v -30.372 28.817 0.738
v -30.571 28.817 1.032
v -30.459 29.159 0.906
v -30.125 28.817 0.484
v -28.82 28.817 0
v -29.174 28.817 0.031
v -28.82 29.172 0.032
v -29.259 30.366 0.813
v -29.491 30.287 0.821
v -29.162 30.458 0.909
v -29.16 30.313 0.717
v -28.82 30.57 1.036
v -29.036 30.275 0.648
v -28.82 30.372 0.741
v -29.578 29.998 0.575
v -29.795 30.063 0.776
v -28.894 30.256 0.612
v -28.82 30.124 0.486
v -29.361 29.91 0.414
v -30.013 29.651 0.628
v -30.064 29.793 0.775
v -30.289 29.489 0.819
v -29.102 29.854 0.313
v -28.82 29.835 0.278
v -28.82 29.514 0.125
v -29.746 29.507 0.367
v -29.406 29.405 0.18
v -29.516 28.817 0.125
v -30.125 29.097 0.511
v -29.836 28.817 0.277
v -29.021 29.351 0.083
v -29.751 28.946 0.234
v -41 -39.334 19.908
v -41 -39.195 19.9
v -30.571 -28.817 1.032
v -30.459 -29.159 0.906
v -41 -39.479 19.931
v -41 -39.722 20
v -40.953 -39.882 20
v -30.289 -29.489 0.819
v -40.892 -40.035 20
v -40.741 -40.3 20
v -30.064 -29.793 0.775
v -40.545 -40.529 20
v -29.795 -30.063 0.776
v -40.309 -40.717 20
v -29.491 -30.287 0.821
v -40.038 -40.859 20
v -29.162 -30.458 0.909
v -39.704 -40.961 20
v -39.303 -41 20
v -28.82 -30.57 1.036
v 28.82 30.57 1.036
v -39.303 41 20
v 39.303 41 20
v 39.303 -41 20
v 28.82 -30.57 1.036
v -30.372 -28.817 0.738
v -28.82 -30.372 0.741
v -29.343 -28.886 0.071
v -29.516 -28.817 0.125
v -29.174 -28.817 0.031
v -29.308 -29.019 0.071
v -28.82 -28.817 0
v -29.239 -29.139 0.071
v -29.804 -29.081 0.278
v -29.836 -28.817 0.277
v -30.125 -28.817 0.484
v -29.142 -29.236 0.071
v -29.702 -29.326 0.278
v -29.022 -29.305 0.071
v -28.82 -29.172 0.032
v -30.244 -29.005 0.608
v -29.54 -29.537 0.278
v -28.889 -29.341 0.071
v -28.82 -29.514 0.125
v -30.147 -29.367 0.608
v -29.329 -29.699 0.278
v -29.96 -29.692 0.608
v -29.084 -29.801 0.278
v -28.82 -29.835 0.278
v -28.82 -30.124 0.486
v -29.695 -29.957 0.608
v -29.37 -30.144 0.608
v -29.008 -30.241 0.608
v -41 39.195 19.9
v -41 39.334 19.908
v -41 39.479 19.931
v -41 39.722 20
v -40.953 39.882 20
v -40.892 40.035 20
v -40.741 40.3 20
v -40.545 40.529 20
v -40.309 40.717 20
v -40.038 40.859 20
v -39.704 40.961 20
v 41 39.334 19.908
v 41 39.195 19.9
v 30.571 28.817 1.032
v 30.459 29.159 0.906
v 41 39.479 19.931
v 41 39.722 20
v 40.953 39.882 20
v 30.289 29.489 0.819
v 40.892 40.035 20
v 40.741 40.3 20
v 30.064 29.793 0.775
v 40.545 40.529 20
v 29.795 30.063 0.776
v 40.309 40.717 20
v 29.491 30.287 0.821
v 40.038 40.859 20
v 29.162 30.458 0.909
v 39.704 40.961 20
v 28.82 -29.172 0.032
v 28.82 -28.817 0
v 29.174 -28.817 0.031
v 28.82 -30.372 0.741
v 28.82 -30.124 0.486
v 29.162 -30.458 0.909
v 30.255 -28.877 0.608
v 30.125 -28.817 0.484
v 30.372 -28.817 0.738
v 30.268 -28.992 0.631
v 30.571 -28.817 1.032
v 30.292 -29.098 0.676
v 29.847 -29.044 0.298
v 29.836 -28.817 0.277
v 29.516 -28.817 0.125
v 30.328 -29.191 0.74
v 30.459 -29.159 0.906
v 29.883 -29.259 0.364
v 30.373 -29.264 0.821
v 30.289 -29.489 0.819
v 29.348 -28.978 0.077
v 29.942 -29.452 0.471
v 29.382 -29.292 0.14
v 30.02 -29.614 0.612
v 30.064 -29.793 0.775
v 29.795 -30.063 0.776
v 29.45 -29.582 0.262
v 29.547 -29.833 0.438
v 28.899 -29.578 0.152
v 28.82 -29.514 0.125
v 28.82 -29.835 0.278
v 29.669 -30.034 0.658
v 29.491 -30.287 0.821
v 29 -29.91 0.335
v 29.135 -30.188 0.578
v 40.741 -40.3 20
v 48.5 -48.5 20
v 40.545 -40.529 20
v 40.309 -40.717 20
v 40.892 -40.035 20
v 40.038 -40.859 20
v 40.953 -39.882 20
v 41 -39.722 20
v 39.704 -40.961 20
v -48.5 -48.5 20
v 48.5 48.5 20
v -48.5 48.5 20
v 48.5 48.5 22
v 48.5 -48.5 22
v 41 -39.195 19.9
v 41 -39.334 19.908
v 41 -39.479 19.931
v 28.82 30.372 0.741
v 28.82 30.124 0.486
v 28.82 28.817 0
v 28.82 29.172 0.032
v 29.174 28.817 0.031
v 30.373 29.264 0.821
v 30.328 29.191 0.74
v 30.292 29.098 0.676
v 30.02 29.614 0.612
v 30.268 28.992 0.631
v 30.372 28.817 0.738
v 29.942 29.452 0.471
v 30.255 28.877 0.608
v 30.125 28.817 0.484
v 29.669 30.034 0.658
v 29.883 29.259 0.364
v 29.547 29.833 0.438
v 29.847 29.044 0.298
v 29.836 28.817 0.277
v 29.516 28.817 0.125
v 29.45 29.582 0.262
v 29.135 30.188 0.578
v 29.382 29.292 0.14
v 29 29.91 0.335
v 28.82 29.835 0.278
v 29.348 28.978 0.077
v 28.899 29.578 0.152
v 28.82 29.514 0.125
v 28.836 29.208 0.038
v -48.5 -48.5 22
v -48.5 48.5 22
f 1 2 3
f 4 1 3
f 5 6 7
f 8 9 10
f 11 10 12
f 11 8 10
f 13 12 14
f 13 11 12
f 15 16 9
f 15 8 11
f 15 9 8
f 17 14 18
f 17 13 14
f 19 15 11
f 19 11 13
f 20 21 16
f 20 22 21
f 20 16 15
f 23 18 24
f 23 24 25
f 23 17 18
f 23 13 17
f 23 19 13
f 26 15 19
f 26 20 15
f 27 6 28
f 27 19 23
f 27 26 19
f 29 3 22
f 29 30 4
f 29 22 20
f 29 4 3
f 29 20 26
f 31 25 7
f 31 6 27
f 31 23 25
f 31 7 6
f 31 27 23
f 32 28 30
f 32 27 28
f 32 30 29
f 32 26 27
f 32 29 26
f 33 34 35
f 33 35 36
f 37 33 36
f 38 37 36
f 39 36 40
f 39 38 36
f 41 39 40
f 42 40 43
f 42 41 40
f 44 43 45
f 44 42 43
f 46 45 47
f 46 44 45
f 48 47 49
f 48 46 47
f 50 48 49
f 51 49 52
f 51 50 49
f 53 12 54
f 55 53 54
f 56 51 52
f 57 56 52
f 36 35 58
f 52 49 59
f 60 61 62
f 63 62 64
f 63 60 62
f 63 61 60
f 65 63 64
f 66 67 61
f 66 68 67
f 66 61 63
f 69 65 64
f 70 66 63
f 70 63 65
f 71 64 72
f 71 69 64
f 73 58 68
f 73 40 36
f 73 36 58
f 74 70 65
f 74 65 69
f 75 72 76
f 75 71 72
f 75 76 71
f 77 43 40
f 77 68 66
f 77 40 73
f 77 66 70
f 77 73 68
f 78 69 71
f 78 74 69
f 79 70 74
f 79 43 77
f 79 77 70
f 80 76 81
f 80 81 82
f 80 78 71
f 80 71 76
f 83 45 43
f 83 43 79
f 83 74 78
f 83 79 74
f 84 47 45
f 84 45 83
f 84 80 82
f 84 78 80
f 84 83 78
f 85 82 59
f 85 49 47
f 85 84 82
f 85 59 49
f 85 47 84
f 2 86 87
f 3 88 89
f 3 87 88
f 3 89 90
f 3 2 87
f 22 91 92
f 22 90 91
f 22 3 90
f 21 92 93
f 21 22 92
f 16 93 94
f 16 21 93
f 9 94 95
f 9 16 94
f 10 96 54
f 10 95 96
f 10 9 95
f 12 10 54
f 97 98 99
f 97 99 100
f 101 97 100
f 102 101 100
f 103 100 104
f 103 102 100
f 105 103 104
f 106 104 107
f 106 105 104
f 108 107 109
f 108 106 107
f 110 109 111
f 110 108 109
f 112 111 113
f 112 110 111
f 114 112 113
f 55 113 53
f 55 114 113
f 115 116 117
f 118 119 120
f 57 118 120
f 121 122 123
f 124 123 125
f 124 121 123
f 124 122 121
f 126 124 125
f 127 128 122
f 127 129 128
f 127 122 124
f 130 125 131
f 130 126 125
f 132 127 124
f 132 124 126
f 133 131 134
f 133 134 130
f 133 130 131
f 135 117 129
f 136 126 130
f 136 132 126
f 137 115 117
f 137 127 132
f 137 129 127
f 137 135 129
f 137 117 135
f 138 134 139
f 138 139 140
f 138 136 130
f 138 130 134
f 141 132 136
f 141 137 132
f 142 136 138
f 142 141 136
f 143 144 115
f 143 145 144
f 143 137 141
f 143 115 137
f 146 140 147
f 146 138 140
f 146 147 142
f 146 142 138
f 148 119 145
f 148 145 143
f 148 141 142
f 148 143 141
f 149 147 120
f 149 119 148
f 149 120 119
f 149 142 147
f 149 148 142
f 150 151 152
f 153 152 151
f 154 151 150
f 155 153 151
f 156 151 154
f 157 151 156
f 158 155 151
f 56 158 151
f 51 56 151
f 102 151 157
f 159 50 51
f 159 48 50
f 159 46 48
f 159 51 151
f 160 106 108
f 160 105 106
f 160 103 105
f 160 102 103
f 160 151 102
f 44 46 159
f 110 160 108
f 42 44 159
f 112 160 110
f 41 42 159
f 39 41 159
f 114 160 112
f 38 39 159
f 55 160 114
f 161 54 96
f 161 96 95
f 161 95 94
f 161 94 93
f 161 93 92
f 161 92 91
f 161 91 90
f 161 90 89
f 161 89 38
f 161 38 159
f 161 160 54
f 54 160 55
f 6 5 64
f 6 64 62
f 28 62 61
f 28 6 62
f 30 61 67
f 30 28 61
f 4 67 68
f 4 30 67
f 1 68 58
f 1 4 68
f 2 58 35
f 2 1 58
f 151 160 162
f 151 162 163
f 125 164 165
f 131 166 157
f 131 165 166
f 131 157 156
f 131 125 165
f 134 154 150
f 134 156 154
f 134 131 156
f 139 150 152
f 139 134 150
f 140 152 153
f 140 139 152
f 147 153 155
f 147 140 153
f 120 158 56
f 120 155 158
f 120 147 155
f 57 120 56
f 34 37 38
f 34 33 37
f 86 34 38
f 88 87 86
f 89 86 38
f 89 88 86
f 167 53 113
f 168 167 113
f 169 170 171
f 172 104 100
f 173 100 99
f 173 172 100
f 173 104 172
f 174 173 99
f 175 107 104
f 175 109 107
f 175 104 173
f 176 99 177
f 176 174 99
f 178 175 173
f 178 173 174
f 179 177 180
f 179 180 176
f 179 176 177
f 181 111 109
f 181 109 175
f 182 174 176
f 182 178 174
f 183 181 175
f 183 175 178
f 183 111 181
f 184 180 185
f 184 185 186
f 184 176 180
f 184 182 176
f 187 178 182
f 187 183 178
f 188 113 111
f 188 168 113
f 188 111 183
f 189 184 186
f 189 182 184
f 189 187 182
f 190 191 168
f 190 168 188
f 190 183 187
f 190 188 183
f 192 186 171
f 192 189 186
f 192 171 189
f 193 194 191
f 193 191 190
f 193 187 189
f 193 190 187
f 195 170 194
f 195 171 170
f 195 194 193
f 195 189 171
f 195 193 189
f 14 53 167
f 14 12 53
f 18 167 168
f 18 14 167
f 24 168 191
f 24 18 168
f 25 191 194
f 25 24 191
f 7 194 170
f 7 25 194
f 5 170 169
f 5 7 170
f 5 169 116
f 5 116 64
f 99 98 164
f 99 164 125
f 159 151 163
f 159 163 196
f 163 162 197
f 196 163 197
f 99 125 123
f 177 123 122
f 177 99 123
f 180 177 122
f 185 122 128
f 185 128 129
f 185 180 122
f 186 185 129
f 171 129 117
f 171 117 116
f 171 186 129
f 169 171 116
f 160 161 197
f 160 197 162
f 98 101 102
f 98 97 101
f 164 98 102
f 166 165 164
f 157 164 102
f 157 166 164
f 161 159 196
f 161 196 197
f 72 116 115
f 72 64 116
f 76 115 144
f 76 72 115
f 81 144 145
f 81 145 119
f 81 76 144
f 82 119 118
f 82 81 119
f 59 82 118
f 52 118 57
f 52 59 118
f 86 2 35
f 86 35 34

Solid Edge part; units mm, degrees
sketch "Sketch1" plane through (0, 0, 0) normal (0, 0, 1) x (1, 0, 0)
  line L0 (41, -41) -> (-41, -41)
  line L1 (-41, -41) -> (-41, 41)
  line L2 (-41, 41) -> (41, 41)
  line L3 (41, 41) -> (41, -41)
  dimension "D1" = 41
  dimension "D2" = 41
extrude "Protrusion1" add sketch "Sketch1" along normal blind 20
sketch "Sketch2" plane through (41, 0, 10) normal (1, 0, 0) x (0, 1, 0)
  line L0 (-41, 10) -> (-30, -10)
  line L1 (-30, -10) -> (30, -10)
  line L2 (30, -10) -> (41, 10)
  line L3 (-41, 10) -> (41, 10)
extrude "Cutout1" cut sketch "Sketch2" against normal through all flip side to cut
sketch "Sketch3" plane through (0, 0, 20) normal (0, 0, 1) x (0, 1, 0)
  line L0 (48.5, -48.5) -> (-48.5, -48.5)
  line L1 (-48.5, -48.5) -> (-48.5, 48.5)
  line L2 (-48.5, 48.5) -> (48.5, 48.5)
  line L3 (48.5, 48.5) -> (48.5, -48.5)
  dimension "D1" = 48.5
  dimension "D2" = 48.5
extrude "ExtrudedProtrusion_2" add sketch "Sketch3" along normal blind 2
sketch "Sketch4" plane through (0, -48.5, 21.5) normal (0, -1, 0) x (1, 0, 0)
  line L0 (41, -1.6) -> (30, -21.5)
  line L1 (30, -21.5) -> (-30, -21.5)
  line L2 (-30, -21.5) -> (-41, -1.6)
  line L3 (-41, -1.6) -> (-51.646, -1.6)
  line L4 (-51.646, -1.6) -> (-51.646, 3.6738)
  line L5 (-51.646, 3.6738) -> (52.1886, 3.6738)
  line L6 (52.1886, 3.6738) -> (52.1886, -1.6)
  line L7 (52.1886, -1.6) -> (41, -1.6)
  dimension "D1" = 30
extrude "Cutout2" cut sketch "Sketch4" against normal through all flip side to cut
fillet "Round_1" radius 2 8 edges at (-35.5, -35.4725, 9.95) (0, -30, 0) (-30, 0, 0) (-35.5, 35.4725, 9.95) (0, 30, 0) (35.5, 35.4725, 9.95) (30, 0, 0) (35.5, -35.4725, 9.95)
